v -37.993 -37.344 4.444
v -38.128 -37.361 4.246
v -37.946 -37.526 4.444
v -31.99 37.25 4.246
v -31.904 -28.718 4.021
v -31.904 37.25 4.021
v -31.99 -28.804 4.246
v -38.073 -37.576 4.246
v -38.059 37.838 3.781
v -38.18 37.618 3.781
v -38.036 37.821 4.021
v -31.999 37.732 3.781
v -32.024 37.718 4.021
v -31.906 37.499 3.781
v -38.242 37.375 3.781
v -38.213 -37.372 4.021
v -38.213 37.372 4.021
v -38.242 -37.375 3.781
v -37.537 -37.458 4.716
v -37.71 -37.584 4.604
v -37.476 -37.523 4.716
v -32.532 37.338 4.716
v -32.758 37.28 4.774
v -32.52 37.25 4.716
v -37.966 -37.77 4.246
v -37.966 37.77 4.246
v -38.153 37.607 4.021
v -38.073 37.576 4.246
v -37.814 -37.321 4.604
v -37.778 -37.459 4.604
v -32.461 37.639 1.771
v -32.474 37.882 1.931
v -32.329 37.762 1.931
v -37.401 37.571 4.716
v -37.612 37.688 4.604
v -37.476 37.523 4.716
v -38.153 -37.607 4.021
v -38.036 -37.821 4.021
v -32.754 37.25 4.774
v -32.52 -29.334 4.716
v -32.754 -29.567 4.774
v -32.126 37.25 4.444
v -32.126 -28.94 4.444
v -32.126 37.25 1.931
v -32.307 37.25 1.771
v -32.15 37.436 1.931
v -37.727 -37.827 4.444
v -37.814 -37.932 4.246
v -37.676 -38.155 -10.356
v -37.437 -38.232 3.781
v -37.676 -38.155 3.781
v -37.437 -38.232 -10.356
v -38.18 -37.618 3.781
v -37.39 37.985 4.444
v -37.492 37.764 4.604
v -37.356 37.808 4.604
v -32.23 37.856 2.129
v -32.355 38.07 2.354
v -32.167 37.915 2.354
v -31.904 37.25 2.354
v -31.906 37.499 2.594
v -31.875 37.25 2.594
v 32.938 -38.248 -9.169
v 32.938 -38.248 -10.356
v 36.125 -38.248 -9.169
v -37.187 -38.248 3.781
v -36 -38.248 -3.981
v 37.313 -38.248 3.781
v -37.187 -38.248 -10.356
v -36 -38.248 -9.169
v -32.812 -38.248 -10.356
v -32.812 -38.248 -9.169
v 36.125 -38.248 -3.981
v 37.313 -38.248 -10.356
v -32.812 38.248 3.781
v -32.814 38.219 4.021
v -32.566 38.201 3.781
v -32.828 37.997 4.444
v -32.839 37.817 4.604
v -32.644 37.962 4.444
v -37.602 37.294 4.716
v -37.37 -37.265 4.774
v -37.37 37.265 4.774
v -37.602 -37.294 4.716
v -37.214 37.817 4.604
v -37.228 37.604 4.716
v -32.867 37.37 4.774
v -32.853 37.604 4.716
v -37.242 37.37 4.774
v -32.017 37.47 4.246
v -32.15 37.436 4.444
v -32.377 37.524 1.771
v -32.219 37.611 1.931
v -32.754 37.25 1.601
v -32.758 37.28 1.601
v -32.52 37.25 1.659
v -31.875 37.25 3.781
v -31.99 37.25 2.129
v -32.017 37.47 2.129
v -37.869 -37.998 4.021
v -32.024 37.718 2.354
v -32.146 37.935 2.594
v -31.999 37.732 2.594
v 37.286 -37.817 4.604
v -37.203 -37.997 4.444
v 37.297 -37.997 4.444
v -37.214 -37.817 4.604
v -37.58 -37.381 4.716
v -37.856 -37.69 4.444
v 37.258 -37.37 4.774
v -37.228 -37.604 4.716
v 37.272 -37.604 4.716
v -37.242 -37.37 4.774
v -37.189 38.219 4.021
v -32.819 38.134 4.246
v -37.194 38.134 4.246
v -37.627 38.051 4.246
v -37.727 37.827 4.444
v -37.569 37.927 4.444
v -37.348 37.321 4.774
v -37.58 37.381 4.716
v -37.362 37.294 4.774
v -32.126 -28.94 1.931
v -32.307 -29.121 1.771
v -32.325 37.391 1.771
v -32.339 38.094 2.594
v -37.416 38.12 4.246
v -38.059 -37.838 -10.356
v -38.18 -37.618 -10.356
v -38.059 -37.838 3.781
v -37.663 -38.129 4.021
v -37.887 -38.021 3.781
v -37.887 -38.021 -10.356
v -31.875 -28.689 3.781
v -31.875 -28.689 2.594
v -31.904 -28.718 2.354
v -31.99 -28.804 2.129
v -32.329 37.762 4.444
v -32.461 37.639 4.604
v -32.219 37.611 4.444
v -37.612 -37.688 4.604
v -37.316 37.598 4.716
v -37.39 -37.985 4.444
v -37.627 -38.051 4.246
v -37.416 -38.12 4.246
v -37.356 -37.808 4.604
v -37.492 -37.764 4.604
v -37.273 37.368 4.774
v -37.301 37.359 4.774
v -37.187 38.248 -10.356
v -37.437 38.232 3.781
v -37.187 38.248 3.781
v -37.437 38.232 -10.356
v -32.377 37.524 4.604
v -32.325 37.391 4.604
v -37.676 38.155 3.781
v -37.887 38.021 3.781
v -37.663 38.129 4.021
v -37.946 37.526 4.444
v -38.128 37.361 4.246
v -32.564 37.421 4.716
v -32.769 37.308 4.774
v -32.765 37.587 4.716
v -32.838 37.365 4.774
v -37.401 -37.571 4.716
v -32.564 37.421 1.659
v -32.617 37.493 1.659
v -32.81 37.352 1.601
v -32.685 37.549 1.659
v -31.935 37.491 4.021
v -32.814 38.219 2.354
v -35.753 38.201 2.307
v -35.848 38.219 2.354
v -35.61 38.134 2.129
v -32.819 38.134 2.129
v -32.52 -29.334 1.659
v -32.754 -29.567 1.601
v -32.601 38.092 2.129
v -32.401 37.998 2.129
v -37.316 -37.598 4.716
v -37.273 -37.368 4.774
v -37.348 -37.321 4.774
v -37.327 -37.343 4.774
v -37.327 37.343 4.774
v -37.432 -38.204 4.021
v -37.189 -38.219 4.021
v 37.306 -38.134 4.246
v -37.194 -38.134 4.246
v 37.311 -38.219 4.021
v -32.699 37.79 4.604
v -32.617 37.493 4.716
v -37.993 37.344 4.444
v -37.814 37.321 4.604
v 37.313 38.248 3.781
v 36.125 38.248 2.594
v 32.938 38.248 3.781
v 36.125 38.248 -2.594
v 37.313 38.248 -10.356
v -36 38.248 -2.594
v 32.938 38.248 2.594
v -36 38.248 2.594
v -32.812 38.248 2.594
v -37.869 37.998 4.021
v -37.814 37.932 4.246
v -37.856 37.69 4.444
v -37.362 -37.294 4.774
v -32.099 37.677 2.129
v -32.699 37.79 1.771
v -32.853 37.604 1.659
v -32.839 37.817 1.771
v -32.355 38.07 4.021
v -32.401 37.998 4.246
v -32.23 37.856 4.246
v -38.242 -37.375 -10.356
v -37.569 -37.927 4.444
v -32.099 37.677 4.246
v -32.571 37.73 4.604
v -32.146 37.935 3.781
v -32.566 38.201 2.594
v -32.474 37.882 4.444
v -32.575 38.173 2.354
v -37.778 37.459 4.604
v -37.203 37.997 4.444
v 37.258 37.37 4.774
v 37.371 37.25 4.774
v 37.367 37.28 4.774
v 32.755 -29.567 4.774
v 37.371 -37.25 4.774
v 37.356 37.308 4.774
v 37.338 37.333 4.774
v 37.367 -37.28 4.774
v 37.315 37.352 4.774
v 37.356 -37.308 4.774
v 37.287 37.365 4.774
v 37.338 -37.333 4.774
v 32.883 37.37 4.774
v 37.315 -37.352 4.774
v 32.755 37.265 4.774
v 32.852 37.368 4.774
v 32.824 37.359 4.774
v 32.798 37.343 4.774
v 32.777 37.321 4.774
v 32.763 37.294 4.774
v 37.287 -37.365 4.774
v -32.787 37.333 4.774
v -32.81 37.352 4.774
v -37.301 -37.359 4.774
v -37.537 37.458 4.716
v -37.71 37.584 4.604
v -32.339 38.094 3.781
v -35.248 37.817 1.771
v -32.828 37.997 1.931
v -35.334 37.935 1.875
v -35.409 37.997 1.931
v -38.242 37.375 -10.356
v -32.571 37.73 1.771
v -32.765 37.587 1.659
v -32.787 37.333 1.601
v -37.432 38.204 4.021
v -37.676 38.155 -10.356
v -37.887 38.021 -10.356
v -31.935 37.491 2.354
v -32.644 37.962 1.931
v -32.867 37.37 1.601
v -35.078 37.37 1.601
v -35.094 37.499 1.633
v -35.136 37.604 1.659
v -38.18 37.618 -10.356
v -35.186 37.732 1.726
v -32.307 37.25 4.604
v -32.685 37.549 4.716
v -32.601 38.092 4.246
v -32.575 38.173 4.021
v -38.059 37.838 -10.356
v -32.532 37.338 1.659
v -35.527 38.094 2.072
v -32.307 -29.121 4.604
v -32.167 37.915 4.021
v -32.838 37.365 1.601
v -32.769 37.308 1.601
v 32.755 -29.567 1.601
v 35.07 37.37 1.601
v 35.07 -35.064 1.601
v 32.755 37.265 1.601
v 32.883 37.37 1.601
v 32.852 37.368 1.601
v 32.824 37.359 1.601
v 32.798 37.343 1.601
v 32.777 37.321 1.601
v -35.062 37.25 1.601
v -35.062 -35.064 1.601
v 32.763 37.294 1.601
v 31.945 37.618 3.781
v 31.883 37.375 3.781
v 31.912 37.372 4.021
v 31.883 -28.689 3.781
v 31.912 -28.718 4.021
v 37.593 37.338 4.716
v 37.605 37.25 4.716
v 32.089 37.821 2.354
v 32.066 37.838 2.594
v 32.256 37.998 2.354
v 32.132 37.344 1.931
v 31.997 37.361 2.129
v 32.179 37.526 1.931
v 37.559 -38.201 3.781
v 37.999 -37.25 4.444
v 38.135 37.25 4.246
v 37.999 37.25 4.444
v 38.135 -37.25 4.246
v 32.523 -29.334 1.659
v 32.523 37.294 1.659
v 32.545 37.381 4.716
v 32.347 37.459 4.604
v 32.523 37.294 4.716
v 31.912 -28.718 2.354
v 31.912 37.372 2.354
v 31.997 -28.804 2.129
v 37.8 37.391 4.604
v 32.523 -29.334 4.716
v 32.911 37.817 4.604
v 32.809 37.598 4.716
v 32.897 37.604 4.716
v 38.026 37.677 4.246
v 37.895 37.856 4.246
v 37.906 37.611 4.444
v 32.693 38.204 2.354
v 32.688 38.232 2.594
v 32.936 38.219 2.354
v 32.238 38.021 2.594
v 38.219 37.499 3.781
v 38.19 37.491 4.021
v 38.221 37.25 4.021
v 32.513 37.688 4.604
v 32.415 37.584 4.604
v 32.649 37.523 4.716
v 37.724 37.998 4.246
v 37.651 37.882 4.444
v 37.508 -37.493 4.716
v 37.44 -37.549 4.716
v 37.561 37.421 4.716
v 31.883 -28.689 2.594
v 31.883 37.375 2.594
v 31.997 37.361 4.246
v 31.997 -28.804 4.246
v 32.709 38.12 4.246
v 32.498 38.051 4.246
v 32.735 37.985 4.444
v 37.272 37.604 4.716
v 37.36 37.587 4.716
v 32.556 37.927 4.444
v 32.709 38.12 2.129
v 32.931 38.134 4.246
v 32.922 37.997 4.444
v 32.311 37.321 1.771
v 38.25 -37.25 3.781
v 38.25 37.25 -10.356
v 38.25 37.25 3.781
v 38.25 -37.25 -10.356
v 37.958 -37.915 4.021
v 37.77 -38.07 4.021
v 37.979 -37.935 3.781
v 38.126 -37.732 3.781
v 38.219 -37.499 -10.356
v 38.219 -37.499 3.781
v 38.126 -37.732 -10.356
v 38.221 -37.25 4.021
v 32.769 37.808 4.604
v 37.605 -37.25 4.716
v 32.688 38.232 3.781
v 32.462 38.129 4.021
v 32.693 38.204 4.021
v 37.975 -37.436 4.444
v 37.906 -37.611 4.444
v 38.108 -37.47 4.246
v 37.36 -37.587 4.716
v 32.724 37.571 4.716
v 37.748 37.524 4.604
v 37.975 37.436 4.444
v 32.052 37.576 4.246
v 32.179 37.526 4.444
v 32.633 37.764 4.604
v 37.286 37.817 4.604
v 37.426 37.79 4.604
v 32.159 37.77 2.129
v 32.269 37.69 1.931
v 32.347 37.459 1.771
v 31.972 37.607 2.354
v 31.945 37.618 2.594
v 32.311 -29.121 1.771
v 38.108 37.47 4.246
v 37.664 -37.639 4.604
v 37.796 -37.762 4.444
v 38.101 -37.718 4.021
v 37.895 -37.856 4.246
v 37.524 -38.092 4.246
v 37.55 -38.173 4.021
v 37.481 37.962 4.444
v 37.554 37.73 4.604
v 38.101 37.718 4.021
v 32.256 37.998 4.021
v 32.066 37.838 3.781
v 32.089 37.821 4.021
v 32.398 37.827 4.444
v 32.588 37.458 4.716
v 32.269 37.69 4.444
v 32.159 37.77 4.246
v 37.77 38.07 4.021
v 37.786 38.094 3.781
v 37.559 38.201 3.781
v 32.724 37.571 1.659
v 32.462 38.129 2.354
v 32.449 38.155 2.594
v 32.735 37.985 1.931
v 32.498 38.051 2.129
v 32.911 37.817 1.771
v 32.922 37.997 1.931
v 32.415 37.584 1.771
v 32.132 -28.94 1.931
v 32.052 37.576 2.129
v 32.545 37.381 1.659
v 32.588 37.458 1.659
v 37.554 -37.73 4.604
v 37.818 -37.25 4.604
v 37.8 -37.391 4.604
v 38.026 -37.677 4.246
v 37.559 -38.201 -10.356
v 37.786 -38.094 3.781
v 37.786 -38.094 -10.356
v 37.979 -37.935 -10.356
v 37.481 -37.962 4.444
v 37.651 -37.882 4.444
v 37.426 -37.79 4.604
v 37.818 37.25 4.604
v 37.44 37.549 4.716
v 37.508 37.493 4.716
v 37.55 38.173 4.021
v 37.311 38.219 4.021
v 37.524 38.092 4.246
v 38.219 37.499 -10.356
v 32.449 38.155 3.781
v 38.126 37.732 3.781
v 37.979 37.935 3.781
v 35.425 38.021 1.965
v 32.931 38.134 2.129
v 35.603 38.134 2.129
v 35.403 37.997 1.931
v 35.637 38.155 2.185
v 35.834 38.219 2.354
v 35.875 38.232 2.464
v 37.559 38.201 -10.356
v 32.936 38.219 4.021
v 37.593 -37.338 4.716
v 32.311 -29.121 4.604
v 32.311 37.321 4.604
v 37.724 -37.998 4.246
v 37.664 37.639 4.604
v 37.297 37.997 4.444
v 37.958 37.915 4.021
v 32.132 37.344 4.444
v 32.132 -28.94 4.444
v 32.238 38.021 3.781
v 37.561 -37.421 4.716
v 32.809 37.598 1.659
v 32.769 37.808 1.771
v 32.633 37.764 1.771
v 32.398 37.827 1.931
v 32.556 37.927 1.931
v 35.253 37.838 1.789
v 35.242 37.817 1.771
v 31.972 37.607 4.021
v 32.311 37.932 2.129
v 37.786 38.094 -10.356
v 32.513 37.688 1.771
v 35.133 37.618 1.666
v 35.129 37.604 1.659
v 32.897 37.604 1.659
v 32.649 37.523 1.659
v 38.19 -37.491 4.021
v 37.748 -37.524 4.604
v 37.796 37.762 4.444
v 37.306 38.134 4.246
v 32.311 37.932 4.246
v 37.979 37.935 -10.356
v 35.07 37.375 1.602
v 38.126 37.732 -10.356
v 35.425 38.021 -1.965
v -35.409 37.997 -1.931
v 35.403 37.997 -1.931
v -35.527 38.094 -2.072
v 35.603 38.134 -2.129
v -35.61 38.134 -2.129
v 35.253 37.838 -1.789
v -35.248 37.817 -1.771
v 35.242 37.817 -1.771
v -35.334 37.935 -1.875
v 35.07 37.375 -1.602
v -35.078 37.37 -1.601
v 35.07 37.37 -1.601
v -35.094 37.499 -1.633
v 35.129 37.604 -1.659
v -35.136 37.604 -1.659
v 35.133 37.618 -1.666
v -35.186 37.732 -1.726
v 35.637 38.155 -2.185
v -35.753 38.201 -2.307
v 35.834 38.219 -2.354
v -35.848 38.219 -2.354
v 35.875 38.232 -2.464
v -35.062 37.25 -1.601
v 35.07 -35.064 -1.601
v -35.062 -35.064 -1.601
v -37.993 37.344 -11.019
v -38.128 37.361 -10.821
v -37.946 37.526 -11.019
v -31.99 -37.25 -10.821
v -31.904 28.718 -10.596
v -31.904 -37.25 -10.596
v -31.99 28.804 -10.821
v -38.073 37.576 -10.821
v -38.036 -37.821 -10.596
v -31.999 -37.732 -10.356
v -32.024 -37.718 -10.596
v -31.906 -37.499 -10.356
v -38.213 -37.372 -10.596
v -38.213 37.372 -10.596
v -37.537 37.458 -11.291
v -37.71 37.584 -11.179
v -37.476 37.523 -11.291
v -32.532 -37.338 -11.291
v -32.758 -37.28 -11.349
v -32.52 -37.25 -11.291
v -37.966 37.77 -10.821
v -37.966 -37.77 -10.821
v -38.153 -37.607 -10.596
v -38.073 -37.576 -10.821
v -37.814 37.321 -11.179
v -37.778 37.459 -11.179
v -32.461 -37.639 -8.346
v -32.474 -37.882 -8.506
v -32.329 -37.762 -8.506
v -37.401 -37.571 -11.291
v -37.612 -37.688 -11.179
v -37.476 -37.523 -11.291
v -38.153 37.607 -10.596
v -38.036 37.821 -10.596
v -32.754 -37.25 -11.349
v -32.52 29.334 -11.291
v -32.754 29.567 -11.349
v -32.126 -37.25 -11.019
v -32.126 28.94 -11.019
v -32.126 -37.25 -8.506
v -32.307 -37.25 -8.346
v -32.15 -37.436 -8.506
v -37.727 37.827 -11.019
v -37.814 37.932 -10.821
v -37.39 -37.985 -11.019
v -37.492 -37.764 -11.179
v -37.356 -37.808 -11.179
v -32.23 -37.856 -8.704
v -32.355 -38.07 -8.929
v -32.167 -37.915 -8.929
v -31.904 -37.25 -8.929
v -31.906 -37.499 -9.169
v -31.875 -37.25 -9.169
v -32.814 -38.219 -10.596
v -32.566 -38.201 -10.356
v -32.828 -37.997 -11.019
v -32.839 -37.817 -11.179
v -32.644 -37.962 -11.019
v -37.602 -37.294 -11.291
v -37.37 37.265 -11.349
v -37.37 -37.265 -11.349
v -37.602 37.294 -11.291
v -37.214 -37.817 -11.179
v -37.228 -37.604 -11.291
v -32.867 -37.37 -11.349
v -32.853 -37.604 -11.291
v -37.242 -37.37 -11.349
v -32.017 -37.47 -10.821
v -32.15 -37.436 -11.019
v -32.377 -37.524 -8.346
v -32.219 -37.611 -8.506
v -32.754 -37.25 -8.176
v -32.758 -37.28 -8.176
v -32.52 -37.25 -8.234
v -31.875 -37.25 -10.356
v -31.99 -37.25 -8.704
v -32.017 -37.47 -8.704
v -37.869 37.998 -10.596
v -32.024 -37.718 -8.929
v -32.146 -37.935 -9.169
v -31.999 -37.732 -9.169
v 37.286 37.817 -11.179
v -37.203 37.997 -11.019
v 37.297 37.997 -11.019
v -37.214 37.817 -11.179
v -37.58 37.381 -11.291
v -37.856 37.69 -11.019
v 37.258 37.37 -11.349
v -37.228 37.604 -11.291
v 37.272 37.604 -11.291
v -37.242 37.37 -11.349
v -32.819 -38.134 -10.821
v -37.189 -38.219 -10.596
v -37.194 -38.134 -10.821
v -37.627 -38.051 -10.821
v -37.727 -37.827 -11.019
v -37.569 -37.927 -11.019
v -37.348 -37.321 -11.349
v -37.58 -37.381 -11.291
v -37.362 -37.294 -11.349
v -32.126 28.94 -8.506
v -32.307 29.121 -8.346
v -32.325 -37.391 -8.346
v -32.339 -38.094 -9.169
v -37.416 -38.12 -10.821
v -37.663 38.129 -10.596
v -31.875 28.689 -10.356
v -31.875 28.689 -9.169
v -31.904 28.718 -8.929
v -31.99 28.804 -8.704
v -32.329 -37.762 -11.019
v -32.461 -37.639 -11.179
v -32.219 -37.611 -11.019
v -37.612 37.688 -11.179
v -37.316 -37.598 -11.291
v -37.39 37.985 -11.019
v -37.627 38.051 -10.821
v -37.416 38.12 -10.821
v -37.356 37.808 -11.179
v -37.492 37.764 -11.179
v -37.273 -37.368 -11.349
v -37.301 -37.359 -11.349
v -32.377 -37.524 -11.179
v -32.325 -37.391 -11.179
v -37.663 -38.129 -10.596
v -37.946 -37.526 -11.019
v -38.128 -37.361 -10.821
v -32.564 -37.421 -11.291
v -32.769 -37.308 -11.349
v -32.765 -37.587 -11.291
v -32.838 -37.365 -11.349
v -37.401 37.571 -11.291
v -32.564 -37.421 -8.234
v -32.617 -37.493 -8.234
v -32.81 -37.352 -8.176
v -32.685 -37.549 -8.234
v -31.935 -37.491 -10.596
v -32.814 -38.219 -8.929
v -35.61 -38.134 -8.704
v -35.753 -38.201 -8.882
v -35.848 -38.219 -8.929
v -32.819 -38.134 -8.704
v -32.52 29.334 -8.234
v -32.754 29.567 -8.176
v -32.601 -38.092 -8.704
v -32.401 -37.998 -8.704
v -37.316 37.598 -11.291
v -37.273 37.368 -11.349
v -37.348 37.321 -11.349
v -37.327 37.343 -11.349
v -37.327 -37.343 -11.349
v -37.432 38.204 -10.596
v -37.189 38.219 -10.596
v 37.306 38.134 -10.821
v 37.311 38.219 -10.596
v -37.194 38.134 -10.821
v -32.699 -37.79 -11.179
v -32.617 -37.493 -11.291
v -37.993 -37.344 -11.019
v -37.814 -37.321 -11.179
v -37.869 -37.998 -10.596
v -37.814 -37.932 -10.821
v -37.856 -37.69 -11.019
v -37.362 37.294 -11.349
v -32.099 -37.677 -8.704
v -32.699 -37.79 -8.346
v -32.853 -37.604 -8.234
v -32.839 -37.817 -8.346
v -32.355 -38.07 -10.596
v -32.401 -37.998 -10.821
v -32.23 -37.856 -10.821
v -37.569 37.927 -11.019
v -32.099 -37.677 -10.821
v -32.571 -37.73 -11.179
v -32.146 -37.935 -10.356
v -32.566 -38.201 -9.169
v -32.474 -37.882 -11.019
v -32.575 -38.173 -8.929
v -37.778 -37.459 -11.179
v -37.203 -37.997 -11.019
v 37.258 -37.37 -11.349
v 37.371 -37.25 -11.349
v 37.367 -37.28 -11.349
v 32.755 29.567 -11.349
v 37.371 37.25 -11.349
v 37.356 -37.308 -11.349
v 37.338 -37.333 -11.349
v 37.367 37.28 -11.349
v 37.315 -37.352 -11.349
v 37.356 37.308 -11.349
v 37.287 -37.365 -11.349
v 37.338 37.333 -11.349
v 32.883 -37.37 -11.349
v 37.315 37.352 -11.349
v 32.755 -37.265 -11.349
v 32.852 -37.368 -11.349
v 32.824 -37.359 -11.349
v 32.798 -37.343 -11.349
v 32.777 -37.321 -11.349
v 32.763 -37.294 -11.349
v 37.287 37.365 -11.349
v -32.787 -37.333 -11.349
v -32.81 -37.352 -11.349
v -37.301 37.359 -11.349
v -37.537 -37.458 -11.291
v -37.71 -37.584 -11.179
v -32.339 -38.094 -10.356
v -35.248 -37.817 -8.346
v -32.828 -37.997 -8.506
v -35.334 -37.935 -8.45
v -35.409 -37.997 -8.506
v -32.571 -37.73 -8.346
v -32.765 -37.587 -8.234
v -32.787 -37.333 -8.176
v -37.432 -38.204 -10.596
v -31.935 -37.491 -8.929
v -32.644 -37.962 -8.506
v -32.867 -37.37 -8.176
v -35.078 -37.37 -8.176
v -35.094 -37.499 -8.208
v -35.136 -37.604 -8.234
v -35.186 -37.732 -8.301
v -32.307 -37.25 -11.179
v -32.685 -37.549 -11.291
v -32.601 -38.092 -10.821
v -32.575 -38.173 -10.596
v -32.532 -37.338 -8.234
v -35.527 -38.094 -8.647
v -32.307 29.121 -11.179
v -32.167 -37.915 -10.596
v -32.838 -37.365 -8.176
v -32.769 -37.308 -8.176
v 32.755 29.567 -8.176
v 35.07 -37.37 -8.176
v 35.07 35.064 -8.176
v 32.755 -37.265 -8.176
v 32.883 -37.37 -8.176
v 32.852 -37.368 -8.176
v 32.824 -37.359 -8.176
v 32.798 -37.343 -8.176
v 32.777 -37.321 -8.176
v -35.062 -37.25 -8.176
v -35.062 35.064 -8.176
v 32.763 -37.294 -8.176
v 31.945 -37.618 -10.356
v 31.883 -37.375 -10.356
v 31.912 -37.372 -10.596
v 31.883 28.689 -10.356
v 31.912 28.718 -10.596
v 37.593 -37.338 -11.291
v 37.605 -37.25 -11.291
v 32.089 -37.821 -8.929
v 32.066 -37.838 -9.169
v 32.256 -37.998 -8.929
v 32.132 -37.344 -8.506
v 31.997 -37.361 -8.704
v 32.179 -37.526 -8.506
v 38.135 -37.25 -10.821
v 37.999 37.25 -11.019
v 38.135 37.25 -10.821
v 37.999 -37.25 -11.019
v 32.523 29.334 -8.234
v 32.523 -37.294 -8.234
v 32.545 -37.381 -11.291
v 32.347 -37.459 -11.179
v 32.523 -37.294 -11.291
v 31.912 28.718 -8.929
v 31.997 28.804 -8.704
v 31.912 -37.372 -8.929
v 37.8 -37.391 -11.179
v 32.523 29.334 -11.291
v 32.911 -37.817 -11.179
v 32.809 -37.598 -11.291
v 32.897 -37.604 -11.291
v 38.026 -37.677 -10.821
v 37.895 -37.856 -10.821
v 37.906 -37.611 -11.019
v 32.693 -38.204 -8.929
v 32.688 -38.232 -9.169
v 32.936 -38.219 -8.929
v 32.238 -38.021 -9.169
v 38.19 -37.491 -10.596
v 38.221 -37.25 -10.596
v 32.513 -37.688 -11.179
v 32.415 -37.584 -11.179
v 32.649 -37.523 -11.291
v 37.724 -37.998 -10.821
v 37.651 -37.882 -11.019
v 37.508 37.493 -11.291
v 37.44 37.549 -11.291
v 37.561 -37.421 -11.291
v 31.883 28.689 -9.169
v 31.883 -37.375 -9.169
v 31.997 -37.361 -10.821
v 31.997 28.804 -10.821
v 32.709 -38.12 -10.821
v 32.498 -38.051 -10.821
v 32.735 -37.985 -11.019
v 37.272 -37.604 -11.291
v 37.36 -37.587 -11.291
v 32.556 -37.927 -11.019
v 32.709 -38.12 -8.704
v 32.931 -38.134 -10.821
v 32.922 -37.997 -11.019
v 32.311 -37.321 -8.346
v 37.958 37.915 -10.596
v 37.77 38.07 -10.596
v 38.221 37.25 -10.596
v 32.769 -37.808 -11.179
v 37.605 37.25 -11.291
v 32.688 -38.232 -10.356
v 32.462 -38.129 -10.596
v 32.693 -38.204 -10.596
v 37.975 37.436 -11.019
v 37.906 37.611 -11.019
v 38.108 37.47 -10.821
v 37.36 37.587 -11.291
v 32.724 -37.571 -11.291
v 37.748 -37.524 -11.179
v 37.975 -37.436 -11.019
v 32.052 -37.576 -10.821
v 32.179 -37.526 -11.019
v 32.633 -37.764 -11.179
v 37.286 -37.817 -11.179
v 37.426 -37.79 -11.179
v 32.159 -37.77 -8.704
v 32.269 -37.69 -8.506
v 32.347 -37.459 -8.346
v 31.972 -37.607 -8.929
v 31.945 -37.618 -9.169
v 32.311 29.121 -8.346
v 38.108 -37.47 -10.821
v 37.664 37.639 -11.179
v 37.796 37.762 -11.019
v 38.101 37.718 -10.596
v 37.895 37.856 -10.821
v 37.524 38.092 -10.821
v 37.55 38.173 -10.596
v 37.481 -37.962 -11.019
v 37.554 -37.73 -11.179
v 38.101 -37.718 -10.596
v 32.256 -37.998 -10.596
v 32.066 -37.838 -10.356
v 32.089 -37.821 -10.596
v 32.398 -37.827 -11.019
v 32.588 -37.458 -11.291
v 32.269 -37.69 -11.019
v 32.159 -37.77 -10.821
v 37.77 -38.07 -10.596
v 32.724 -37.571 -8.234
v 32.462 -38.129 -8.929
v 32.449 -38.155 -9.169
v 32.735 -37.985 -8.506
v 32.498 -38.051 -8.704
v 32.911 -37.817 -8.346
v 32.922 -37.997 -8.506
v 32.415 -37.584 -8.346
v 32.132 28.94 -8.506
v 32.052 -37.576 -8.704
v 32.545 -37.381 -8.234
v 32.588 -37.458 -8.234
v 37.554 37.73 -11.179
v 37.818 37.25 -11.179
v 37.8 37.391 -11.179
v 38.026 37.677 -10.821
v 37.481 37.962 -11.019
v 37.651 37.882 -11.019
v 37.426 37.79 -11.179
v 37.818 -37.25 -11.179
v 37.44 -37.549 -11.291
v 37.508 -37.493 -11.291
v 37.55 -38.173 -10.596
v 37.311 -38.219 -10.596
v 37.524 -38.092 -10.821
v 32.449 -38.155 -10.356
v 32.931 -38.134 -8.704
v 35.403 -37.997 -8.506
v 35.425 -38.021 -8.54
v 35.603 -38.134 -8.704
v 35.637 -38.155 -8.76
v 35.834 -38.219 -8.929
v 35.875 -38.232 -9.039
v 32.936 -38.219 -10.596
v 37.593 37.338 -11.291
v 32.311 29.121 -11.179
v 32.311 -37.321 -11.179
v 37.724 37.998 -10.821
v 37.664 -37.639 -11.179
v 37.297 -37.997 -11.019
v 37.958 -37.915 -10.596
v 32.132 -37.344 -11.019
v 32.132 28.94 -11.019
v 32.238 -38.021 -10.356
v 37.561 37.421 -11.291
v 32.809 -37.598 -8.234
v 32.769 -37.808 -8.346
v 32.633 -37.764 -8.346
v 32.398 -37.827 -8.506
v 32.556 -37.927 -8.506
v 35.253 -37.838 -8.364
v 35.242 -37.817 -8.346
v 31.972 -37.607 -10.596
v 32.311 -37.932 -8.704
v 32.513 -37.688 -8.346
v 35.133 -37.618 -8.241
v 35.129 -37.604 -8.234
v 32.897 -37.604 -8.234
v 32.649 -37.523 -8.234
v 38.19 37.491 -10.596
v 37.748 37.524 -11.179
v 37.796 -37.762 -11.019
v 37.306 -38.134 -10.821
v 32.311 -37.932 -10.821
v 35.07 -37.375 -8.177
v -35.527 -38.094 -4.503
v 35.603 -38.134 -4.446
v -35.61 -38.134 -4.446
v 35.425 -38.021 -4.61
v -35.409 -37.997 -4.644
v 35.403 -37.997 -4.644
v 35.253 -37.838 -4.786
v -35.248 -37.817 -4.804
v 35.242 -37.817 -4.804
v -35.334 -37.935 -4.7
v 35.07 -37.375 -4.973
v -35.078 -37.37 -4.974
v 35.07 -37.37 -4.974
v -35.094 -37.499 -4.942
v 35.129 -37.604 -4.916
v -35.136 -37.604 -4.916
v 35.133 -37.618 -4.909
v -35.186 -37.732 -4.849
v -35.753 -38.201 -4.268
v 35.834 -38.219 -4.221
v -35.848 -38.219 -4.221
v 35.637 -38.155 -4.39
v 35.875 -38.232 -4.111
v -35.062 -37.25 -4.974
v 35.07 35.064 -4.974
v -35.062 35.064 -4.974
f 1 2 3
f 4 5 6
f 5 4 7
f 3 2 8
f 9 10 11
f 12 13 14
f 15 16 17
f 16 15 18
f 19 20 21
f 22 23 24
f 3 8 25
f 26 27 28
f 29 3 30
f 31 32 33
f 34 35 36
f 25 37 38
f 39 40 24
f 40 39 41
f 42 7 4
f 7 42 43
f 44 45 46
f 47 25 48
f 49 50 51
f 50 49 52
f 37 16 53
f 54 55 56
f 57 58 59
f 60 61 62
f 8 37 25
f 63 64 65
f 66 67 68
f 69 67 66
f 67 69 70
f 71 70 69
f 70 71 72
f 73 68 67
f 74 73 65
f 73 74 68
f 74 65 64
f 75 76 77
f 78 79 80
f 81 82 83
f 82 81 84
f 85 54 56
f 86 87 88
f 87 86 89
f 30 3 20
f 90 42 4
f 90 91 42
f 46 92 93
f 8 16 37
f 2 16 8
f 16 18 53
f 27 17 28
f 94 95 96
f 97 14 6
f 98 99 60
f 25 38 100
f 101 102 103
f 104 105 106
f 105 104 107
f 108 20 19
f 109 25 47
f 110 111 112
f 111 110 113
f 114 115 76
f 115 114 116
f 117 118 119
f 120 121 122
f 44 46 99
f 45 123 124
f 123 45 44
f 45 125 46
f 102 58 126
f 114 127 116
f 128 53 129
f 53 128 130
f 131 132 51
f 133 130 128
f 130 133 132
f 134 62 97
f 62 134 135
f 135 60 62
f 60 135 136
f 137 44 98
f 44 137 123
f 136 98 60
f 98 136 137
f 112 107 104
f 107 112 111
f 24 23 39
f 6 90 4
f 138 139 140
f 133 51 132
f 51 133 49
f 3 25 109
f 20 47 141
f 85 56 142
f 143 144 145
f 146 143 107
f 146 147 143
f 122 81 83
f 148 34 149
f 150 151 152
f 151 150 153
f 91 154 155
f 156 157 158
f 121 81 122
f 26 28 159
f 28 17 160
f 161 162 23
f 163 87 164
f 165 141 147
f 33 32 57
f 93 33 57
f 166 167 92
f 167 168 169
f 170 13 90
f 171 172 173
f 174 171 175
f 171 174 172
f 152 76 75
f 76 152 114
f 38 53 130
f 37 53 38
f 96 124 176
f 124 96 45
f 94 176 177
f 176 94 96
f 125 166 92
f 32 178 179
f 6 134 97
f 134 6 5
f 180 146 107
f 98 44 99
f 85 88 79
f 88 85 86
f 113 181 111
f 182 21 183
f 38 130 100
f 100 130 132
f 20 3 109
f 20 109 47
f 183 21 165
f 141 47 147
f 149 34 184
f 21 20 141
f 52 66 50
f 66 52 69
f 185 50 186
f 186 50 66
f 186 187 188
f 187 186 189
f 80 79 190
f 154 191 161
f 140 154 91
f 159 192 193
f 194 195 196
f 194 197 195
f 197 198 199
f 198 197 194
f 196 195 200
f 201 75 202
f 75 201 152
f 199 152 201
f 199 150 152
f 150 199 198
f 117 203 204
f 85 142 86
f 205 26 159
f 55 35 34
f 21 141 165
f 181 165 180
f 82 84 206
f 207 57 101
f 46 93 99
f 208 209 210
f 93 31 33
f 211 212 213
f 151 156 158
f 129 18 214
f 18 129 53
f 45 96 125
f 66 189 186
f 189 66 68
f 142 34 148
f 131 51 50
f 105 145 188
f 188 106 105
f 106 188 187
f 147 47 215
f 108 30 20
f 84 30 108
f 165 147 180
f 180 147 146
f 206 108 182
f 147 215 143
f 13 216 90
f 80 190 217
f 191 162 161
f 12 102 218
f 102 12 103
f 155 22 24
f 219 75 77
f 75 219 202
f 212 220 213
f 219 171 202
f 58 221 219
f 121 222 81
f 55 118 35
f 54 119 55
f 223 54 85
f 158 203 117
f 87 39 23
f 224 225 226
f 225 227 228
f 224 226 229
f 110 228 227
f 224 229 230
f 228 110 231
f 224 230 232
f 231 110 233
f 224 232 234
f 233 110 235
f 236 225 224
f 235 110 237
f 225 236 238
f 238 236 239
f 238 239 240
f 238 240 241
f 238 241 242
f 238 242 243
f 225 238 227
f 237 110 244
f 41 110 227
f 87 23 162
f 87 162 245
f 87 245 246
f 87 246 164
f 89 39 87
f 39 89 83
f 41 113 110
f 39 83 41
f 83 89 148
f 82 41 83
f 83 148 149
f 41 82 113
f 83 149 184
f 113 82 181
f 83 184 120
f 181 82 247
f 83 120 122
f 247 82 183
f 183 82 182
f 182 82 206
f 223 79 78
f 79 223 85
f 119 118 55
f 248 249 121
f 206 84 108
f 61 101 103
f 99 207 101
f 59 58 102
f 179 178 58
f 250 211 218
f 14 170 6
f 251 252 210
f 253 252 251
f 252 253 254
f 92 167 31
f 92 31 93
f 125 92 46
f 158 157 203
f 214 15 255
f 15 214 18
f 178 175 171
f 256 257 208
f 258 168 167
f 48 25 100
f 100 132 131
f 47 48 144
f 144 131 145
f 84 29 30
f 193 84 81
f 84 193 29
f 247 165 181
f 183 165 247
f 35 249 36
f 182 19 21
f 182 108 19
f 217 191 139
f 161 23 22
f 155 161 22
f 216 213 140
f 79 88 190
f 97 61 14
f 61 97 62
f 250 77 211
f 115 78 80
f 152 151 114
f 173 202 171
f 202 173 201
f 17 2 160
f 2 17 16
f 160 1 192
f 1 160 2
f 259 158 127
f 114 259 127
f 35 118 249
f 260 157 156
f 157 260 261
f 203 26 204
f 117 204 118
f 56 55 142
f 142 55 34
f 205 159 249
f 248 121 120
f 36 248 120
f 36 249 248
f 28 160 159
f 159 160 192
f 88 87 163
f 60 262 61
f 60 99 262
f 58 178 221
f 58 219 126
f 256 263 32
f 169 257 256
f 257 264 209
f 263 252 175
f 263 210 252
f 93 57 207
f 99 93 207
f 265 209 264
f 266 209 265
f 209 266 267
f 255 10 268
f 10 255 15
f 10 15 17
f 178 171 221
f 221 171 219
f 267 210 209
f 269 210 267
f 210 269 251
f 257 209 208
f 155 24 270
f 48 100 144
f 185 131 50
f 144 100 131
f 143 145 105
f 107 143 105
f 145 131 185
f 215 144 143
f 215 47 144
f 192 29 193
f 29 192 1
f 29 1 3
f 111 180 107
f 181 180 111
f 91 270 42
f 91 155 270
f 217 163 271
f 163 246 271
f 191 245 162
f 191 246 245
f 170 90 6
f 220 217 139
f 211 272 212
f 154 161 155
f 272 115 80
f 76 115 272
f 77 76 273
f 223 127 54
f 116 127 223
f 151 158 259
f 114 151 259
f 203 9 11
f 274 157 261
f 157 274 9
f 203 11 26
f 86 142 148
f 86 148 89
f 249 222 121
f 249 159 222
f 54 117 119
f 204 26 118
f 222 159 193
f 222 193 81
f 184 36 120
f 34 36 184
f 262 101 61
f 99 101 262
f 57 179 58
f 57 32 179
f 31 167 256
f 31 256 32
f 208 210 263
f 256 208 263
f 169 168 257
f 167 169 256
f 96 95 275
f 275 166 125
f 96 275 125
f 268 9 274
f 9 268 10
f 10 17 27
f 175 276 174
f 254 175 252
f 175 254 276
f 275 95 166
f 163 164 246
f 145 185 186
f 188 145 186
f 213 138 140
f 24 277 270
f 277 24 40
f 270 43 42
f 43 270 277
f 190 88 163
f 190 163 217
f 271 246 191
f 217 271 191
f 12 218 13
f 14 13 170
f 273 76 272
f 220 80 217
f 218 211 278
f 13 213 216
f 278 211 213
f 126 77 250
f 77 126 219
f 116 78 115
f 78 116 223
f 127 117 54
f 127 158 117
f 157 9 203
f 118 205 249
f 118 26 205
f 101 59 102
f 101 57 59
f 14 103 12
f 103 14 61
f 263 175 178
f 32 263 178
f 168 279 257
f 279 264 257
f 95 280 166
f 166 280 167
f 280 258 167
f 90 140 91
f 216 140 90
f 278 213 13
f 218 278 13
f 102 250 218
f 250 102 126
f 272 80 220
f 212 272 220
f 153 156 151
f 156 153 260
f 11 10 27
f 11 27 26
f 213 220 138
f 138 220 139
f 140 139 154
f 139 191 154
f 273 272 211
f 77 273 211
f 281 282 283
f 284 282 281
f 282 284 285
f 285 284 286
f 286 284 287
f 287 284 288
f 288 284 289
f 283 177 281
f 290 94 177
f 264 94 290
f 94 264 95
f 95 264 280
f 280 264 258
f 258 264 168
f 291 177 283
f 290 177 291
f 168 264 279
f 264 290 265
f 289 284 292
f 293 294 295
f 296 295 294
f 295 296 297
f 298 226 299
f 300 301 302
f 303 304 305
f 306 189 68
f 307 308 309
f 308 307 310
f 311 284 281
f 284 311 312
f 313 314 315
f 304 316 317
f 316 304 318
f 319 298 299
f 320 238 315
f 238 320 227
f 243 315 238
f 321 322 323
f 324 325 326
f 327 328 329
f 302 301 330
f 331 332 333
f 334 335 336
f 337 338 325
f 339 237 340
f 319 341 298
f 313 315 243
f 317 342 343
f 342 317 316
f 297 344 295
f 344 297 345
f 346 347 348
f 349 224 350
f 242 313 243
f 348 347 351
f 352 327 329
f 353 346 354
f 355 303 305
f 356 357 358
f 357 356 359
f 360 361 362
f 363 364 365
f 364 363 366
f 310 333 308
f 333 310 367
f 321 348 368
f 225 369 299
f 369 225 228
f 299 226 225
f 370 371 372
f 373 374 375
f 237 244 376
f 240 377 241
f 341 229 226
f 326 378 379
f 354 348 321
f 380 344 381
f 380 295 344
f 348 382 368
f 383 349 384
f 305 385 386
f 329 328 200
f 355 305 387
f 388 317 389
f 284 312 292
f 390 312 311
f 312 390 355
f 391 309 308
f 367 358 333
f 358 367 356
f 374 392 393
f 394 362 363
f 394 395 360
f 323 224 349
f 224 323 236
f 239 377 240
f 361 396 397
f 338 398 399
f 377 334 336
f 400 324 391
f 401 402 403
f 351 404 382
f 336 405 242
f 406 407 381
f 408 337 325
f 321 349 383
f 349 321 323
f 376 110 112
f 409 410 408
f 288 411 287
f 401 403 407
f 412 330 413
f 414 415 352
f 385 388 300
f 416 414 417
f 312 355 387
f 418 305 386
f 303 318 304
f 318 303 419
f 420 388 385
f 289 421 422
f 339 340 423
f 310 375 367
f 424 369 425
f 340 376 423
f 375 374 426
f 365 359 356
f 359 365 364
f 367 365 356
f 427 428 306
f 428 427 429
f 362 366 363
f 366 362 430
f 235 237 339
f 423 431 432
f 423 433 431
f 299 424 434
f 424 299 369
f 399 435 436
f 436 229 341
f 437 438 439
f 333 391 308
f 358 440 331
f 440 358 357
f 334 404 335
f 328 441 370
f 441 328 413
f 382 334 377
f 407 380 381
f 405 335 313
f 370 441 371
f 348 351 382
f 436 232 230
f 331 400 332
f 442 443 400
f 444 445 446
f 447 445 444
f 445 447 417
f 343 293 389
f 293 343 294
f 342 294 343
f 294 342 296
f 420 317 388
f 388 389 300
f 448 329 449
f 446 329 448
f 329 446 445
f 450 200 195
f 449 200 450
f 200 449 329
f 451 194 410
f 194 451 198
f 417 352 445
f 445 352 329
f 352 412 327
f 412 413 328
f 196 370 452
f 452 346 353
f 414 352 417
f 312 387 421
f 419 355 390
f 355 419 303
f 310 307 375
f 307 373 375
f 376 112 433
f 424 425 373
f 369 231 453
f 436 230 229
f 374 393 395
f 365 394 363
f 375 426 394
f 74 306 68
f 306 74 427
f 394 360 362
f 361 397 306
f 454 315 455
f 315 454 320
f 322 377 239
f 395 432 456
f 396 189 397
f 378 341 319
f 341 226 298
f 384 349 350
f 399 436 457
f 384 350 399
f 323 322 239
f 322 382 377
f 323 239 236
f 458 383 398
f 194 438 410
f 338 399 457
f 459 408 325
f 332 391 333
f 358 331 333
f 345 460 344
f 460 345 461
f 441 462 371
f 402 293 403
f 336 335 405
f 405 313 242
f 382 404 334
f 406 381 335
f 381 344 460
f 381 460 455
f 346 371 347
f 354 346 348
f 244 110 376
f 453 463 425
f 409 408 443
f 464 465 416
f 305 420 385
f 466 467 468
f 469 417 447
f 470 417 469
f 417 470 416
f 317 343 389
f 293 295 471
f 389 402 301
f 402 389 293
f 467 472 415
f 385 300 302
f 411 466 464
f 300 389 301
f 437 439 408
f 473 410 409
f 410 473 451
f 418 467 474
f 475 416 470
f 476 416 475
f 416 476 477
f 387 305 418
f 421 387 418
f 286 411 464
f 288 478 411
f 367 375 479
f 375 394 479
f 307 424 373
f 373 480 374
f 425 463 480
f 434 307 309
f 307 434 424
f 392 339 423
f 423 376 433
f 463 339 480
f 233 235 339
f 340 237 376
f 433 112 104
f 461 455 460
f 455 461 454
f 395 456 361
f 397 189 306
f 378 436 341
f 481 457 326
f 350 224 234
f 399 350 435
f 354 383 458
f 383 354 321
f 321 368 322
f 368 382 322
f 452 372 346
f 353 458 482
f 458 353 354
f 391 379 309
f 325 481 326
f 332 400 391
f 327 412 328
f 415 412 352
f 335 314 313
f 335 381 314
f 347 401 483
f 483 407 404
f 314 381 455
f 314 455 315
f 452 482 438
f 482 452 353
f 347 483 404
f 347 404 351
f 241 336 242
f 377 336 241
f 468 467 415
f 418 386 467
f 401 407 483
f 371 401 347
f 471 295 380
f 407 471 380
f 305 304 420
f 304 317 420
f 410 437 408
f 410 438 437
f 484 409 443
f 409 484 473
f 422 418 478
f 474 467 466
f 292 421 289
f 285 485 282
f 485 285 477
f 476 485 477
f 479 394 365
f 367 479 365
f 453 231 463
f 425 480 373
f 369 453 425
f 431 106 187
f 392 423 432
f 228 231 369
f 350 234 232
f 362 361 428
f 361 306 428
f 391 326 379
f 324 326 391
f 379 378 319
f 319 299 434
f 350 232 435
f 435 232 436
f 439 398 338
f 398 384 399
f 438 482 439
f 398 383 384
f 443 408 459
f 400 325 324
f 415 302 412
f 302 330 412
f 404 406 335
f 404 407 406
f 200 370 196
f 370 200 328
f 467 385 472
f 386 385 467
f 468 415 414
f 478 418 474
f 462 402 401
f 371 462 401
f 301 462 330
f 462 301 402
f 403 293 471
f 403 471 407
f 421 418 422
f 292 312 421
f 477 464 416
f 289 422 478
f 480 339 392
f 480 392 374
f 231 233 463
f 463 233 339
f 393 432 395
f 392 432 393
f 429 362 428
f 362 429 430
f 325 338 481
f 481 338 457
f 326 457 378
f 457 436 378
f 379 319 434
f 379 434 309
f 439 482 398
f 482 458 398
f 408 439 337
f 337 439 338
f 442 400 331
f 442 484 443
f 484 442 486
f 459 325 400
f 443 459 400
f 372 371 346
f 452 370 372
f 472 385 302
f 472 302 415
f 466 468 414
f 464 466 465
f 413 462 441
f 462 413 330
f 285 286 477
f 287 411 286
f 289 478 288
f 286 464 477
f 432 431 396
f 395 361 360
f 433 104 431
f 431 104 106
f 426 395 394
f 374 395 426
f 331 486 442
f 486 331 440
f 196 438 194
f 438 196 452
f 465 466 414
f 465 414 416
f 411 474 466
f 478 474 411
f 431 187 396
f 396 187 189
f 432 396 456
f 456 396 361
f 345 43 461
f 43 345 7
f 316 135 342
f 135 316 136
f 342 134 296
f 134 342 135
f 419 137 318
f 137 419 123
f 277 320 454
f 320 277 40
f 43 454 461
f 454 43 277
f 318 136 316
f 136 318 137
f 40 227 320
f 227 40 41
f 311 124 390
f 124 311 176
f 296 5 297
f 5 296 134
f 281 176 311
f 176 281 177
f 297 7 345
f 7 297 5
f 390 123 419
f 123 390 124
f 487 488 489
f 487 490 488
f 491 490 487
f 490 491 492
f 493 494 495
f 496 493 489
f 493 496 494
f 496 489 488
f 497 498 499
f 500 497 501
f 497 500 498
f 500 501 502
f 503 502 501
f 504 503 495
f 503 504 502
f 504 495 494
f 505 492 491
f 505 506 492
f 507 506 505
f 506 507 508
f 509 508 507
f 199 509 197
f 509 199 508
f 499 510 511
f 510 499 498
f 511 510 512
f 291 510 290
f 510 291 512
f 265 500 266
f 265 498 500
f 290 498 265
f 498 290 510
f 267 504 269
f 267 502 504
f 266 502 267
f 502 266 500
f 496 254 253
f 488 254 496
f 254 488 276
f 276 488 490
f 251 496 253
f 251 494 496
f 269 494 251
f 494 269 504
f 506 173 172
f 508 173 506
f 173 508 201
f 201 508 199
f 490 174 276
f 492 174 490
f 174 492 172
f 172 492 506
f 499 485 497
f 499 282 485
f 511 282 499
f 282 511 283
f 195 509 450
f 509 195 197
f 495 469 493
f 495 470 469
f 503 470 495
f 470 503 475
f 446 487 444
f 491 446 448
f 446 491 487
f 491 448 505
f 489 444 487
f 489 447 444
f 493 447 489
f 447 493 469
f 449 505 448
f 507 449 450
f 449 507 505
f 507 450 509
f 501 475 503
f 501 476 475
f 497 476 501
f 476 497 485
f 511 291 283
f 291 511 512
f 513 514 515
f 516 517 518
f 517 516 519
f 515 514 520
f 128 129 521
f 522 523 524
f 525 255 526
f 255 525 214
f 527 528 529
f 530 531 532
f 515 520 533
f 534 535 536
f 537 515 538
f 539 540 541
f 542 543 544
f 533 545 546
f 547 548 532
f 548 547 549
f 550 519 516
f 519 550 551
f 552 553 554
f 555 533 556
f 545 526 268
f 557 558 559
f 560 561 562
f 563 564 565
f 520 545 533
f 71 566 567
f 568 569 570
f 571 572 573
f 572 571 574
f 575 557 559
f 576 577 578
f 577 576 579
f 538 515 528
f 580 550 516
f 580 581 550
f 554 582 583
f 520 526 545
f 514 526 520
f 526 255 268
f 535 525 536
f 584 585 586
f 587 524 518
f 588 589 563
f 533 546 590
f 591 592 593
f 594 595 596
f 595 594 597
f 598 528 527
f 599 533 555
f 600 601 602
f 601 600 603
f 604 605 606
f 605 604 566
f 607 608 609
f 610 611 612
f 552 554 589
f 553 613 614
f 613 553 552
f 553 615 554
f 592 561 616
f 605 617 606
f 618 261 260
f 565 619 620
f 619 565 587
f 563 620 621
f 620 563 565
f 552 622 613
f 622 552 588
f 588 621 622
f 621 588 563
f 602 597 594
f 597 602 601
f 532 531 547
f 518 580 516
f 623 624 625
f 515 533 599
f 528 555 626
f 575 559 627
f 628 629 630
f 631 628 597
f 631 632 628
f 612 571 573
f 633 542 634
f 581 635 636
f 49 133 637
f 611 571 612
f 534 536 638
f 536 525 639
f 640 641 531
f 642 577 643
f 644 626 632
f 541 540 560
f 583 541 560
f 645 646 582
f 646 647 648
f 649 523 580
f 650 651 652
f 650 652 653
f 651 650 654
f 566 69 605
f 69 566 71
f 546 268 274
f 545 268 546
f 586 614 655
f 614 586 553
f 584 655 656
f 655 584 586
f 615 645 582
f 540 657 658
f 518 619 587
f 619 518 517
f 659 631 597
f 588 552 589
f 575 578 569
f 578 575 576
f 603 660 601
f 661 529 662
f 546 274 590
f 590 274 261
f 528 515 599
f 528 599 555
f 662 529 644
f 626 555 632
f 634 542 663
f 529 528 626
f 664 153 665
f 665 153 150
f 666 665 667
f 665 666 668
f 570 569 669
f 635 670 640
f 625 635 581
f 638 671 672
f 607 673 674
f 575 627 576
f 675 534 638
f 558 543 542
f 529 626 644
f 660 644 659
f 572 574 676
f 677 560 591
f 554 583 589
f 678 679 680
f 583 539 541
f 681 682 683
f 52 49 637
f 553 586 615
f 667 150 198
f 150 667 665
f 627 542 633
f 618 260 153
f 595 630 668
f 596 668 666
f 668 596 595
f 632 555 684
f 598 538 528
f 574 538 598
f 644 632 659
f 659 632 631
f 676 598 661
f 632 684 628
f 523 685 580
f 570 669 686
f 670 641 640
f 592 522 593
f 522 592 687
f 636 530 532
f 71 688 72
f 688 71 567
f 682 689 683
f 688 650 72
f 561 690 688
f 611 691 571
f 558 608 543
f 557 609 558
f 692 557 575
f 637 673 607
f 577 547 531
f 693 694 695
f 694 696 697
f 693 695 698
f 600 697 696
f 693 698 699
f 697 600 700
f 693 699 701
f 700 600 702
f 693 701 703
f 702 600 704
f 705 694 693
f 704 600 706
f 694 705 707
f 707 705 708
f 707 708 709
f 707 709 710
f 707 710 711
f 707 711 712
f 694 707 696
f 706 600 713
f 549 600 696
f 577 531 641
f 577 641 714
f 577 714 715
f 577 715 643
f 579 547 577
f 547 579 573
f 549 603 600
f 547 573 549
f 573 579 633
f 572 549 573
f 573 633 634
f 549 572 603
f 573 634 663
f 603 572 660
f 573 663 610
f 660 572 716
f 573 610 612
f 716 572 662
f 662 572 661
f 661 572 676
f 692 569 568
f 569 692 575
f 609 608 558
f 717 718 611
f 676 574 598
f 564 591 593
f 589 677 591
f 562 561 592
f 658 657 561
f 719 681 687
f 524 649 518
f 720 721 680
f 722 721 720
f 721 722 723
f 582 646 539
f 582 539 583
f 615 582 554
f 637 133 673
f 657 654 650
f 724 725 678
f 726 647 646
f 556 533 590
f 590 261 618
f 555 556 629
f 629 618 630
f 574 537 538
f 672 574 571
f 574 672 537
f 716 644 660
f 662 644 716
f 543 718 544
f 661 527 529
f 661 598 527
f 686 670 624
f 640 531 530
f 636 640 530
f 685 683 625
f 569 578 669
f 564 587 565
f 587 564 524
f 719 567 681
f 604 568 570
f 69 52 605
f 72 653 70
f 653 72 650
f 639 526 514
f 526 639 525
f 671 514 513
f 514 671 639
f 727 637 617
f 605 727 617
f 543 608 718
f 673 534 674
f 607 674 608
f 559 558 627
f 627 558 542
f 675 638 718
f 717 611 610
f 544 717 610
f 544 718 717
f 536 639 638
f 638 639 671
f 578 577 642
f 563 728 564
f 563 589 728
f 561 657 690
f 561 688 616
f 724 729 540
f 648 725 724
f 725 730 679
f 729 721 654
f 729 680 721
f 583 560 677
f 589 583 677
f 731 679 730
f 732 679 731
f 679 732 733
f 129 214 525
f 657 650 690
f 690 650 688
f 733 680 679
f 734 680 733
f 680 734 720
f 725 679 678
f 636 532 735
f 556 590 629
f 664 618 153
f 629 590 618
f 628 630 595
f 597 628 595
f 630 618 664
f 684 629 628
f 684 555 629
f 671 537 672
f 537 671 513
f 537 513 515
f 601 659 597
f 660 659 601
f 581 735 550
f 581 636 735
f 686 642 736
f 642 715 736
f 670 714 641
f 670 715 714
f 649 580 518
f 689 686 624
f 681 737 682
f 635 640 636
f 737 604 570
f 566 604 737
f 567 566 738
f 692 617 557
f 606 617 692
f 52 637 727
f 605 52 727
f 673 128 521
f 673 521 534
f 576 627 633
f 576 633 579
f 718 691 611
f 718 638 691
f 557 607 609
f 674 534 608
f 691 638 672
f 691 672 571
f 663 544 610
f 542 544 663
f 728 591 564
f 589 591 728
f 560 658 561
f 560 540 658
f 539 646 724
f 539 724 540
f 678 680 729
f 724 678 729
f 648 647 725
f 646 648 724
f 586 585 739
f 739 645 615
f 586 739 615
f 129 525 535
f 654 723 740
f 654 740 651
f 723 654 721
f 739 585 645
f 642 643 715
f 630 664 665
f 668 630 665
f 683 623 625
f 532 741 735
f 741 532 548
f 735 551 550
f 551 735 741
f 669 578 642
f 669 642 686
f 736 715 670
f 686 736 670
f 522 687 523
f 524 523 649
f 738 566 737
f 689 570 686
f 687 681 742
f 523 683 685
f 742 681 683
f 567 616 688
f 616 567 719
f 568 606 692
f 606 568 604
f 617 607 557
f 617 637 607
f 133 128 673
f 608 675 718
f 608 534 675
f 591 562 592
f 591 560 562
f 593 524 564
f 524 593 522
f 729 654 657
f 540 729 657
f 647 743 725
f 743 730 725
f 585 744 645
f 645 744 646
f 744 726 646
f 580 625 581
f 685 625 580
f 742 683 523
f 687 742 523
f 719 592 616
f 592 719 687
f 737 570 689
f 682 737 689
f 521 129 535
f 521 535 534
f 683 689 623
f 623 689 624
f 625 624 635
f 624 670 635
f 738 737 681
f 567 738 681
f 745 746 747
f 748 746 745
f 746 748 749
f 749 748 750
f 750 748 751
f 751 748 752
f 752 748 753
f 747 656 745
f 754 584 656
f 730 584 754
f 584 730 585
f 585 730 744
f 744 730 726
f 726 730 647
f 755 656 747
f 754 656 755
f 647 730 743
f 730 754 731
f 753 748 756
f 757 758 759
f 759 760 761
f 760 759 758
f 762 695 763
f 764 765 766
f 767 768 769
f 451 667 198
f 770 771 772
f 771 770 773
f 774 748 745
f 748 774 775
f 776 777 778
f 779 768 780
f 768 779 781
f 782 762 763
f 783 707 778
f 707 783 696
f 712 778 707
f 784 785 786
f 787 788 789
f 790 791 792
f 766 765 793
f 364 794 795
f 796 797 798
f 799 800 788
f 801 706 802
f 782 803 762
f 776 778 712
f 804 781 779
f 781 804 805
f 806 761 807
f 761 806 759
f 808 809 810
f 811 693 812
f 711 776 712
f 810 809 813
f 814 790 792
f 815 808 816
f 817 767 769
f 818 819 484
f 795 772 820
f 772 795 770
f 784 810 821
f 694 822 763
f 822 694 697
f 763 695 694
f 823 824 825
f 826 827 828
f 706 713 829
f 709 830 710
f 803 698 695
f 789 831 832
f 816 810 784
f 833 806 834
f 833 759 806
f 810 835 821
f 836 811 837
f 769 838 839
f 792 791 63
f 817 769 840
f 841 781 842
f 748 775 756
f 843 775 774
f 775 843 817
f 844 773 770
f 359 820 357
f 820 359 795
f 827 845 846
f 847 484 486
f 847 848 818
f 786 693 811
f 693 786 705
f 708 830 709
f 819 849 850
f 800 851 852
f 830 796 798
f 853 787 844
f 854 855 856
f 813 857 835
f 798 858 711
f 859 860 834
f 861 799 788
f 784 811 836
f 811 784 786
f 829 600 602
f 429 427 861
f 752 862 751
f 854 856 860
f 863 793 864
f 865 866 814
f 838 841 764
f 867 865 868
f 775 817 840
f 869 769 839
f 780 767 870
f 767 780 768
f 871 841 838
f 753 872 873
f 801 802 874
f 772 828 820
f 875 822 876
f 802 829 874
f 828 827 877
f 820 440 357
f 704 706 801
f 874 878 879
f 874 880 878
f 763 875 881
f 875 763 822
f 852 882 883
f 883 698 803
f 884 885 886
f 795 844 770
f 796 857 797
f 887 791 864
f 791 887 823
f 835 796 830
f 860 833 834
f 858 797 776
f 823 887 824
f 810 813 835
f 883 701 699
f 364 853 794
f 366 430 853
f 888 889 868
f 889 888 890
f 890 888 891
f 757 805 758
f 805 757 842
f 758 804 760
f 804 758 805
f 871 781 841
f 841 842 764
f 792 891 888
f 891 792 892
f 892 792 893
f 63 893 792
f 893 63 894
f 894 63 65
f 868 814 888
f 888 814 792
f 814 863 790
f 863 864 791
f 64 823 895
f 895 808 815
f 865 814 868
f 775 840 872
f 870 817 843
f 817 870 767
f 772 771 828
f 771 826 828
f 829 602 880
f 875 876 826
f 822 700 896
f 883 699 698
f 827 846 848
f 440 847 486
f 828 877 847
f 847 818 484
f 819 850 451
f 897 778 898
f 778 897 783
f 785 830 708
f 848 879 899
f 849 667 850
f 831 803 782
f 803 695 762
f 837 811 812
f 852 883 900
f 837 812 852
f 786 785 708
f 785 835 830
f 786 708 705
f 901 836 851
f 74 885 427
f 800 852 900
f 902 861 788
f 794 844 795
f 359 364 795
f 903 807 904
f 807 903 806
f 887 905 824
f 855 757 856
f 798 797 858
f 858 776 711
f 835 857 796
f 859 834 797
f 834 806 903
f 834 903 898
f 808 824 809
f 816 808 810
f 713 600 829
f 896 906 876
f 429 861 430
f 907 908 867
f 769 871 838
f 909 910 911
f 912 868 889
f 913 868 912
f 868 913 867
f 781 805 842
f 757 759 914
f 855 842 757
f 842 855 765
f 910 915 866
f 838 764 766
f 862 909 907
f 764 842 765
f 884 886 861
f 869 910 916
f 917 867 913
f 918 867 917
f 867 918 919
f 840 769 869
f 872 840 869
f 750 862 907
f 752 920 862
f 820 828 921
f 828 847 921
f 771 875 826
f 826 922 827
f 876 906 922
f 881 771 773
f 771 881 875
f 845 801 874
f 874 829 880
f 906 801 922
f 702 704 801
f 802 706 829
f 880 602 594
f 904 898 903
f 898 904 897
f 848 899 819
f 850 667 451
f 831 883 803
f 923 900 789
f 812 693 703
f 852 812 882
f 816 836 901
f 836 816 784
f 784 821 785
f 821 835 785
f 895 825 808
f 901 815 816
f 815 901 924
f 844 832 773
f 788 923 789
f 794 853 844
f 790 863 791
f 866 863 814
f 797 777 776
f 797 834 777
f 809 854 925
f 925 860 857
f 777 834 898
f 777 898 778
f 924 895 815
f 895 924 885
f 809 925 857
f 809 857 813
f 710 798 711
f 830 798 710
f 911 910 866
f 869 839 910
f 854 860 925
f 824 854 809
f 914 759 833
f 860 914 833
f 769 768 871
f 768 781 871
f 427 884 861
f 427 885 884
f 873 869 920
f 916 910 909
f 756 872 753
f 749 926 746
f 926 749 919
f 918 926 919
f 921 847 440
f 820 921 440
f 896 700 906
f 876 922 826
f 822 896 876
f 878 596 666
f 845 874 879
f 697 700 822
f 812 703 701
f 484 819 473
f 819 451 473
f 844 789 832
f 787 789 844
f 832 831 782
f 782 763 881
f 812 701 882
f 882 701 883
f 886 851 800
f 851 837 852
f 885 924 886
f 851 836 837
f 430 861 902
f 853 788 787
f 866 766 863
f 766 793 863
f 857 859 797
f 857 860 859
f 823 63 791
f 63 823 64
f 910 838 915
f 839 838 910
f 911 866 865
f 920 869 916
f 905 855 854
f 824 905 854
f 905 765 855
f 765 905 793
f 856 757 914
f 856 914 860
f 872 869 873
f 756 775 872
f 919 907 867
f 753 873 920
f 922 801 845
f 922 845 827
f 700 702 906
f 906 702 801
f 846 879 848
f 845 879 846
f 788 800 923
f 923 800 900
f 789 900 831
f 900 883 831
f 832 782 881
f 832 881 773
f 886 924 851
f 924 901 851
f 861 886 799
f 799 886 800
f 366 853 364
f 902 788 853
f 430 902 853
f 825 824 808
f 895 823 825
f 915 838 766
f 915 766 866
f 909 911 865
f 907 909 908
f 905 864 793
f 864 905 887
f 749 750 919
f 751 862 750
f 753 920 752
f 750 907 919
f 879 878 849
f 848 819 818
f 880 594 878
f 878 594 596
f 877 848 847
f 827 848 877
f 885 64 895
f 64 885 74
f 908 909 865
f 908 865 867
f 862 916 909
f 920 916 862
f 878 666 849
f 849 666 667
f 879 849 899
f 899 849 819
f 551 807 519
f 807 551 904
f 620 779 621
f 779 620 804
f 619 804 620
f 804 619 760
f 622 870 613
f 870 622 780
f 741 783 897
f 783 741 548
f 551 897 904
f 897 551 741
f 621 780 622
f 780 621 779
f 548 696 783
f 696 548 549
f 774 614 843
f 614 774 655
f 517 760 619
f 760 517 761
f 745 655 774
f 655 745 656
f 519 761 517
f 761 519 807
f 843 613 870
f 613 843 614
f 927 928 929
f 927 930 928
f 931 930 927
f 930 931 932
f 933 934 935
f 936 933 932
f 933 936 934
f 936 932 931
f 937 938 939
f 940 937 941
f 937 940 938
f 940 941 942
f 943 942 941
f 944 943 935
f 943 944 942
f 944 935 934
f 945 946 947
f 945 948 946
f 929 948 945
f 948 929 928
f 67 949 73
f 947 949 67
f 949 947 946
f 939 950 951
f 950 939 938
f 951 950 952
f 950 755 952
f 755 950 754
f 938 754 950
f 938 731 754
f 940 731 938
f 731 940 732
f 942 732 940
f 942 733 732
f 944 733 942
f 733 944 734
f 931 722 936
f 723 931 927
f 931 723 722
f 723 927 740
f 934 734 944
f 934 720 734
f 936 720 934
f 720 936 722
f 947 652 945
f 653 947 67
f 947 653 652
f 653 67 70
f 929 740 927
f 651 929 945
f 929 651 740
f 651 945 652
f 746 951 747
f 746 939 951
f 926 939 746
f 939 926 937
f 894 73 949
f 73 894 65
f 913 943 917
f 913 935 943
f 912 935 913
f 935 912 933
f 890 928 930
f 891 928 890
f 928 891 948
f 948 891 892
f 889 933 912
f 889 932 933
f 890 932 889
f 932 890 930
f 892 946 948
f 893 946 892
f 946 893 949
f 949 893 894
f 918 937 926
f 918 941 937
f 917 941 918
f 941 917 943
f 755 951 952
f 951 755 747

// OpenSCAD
// file: lib/cover.scad
//fine = true; 
fine = false; 

$fn = fine ? 100 : 25;

roundcorner = 2; 

horn_arc = 45;

horn_diameter = 5;

base_size = 25.5;
plate_thickness = base_size / 8;




module bar(roundcorner = 1, x = base_size, y = base_size, z = plate_thickness, color = "purple") {
    translate([roundcorner, roundcorner, roundcorner]) {
        color(color) {
            minkowski() {
                cube([x - (roundcorner * 2), y - (roundcorner * 2), z - (roundcorner * 2)]);
                sphere(d = roundcorner * 2);
            }
        }
    }
}



    
module cover(x_ness = 1, y_ness = 1) {

    // base plate
    bar(x = base_size * x_ness, y = base_size * y_ness, z = plate_thickness);

    // sides
    bar(color = "green", x = plate_thickness, y = base_size * y_ness, z = plate_thickness * 3);
    translate([(base_size * x_ness) - plate_thickness, 0, 0]) 
        bar(color = "red", x = plate_thickness, y = base_size * y_ness, z = plate_thickness * 3);
    bar(color = "blue", x = base_size * x_ness, y = plate_thickness, z = plate_thickness * 3);
    
    // cover
    translate([0, 0, plate_thickness * 2]) {
        bar(color = "grey", x = plate_thickness * 2, y = base_size * y_ness);
        translate([(base_size * x_ness) - (plate_thickness * 2), 0, 0]) 
            bar(color = "black", x = plate_thickness * 2, y = base_size * y_ness);
        bar(color = "white", x = base_size * x_ness, y = plate_thickness * y_ness);

    }

}
// main file
fine = true;
//fine = false;

$fn = fine ? 100 : 25;



base_size = 25.5;
plate_thickness = base_size / 8;


fudge = 0.2;

use <lib/cover.scad>;

width = 3;
height = 3;

color("red")
translate([-1 * width * (base_size / 2), -1 * height * (base_size / 2), -1 * plate_thickness * 3 / 2]) 
    cover(width, height, fudge);

color("orange")
translate([0, 0, -1 * ((plate_thickness * 2) + fudge)])
    rotate([0, 180, 180]) 
        translate([-1 * width * (base_size / 2), -1 * height * (base_size / 2), -1 * plate_thickness * 3 / 2]) 
            cover(width, height, fudge);
